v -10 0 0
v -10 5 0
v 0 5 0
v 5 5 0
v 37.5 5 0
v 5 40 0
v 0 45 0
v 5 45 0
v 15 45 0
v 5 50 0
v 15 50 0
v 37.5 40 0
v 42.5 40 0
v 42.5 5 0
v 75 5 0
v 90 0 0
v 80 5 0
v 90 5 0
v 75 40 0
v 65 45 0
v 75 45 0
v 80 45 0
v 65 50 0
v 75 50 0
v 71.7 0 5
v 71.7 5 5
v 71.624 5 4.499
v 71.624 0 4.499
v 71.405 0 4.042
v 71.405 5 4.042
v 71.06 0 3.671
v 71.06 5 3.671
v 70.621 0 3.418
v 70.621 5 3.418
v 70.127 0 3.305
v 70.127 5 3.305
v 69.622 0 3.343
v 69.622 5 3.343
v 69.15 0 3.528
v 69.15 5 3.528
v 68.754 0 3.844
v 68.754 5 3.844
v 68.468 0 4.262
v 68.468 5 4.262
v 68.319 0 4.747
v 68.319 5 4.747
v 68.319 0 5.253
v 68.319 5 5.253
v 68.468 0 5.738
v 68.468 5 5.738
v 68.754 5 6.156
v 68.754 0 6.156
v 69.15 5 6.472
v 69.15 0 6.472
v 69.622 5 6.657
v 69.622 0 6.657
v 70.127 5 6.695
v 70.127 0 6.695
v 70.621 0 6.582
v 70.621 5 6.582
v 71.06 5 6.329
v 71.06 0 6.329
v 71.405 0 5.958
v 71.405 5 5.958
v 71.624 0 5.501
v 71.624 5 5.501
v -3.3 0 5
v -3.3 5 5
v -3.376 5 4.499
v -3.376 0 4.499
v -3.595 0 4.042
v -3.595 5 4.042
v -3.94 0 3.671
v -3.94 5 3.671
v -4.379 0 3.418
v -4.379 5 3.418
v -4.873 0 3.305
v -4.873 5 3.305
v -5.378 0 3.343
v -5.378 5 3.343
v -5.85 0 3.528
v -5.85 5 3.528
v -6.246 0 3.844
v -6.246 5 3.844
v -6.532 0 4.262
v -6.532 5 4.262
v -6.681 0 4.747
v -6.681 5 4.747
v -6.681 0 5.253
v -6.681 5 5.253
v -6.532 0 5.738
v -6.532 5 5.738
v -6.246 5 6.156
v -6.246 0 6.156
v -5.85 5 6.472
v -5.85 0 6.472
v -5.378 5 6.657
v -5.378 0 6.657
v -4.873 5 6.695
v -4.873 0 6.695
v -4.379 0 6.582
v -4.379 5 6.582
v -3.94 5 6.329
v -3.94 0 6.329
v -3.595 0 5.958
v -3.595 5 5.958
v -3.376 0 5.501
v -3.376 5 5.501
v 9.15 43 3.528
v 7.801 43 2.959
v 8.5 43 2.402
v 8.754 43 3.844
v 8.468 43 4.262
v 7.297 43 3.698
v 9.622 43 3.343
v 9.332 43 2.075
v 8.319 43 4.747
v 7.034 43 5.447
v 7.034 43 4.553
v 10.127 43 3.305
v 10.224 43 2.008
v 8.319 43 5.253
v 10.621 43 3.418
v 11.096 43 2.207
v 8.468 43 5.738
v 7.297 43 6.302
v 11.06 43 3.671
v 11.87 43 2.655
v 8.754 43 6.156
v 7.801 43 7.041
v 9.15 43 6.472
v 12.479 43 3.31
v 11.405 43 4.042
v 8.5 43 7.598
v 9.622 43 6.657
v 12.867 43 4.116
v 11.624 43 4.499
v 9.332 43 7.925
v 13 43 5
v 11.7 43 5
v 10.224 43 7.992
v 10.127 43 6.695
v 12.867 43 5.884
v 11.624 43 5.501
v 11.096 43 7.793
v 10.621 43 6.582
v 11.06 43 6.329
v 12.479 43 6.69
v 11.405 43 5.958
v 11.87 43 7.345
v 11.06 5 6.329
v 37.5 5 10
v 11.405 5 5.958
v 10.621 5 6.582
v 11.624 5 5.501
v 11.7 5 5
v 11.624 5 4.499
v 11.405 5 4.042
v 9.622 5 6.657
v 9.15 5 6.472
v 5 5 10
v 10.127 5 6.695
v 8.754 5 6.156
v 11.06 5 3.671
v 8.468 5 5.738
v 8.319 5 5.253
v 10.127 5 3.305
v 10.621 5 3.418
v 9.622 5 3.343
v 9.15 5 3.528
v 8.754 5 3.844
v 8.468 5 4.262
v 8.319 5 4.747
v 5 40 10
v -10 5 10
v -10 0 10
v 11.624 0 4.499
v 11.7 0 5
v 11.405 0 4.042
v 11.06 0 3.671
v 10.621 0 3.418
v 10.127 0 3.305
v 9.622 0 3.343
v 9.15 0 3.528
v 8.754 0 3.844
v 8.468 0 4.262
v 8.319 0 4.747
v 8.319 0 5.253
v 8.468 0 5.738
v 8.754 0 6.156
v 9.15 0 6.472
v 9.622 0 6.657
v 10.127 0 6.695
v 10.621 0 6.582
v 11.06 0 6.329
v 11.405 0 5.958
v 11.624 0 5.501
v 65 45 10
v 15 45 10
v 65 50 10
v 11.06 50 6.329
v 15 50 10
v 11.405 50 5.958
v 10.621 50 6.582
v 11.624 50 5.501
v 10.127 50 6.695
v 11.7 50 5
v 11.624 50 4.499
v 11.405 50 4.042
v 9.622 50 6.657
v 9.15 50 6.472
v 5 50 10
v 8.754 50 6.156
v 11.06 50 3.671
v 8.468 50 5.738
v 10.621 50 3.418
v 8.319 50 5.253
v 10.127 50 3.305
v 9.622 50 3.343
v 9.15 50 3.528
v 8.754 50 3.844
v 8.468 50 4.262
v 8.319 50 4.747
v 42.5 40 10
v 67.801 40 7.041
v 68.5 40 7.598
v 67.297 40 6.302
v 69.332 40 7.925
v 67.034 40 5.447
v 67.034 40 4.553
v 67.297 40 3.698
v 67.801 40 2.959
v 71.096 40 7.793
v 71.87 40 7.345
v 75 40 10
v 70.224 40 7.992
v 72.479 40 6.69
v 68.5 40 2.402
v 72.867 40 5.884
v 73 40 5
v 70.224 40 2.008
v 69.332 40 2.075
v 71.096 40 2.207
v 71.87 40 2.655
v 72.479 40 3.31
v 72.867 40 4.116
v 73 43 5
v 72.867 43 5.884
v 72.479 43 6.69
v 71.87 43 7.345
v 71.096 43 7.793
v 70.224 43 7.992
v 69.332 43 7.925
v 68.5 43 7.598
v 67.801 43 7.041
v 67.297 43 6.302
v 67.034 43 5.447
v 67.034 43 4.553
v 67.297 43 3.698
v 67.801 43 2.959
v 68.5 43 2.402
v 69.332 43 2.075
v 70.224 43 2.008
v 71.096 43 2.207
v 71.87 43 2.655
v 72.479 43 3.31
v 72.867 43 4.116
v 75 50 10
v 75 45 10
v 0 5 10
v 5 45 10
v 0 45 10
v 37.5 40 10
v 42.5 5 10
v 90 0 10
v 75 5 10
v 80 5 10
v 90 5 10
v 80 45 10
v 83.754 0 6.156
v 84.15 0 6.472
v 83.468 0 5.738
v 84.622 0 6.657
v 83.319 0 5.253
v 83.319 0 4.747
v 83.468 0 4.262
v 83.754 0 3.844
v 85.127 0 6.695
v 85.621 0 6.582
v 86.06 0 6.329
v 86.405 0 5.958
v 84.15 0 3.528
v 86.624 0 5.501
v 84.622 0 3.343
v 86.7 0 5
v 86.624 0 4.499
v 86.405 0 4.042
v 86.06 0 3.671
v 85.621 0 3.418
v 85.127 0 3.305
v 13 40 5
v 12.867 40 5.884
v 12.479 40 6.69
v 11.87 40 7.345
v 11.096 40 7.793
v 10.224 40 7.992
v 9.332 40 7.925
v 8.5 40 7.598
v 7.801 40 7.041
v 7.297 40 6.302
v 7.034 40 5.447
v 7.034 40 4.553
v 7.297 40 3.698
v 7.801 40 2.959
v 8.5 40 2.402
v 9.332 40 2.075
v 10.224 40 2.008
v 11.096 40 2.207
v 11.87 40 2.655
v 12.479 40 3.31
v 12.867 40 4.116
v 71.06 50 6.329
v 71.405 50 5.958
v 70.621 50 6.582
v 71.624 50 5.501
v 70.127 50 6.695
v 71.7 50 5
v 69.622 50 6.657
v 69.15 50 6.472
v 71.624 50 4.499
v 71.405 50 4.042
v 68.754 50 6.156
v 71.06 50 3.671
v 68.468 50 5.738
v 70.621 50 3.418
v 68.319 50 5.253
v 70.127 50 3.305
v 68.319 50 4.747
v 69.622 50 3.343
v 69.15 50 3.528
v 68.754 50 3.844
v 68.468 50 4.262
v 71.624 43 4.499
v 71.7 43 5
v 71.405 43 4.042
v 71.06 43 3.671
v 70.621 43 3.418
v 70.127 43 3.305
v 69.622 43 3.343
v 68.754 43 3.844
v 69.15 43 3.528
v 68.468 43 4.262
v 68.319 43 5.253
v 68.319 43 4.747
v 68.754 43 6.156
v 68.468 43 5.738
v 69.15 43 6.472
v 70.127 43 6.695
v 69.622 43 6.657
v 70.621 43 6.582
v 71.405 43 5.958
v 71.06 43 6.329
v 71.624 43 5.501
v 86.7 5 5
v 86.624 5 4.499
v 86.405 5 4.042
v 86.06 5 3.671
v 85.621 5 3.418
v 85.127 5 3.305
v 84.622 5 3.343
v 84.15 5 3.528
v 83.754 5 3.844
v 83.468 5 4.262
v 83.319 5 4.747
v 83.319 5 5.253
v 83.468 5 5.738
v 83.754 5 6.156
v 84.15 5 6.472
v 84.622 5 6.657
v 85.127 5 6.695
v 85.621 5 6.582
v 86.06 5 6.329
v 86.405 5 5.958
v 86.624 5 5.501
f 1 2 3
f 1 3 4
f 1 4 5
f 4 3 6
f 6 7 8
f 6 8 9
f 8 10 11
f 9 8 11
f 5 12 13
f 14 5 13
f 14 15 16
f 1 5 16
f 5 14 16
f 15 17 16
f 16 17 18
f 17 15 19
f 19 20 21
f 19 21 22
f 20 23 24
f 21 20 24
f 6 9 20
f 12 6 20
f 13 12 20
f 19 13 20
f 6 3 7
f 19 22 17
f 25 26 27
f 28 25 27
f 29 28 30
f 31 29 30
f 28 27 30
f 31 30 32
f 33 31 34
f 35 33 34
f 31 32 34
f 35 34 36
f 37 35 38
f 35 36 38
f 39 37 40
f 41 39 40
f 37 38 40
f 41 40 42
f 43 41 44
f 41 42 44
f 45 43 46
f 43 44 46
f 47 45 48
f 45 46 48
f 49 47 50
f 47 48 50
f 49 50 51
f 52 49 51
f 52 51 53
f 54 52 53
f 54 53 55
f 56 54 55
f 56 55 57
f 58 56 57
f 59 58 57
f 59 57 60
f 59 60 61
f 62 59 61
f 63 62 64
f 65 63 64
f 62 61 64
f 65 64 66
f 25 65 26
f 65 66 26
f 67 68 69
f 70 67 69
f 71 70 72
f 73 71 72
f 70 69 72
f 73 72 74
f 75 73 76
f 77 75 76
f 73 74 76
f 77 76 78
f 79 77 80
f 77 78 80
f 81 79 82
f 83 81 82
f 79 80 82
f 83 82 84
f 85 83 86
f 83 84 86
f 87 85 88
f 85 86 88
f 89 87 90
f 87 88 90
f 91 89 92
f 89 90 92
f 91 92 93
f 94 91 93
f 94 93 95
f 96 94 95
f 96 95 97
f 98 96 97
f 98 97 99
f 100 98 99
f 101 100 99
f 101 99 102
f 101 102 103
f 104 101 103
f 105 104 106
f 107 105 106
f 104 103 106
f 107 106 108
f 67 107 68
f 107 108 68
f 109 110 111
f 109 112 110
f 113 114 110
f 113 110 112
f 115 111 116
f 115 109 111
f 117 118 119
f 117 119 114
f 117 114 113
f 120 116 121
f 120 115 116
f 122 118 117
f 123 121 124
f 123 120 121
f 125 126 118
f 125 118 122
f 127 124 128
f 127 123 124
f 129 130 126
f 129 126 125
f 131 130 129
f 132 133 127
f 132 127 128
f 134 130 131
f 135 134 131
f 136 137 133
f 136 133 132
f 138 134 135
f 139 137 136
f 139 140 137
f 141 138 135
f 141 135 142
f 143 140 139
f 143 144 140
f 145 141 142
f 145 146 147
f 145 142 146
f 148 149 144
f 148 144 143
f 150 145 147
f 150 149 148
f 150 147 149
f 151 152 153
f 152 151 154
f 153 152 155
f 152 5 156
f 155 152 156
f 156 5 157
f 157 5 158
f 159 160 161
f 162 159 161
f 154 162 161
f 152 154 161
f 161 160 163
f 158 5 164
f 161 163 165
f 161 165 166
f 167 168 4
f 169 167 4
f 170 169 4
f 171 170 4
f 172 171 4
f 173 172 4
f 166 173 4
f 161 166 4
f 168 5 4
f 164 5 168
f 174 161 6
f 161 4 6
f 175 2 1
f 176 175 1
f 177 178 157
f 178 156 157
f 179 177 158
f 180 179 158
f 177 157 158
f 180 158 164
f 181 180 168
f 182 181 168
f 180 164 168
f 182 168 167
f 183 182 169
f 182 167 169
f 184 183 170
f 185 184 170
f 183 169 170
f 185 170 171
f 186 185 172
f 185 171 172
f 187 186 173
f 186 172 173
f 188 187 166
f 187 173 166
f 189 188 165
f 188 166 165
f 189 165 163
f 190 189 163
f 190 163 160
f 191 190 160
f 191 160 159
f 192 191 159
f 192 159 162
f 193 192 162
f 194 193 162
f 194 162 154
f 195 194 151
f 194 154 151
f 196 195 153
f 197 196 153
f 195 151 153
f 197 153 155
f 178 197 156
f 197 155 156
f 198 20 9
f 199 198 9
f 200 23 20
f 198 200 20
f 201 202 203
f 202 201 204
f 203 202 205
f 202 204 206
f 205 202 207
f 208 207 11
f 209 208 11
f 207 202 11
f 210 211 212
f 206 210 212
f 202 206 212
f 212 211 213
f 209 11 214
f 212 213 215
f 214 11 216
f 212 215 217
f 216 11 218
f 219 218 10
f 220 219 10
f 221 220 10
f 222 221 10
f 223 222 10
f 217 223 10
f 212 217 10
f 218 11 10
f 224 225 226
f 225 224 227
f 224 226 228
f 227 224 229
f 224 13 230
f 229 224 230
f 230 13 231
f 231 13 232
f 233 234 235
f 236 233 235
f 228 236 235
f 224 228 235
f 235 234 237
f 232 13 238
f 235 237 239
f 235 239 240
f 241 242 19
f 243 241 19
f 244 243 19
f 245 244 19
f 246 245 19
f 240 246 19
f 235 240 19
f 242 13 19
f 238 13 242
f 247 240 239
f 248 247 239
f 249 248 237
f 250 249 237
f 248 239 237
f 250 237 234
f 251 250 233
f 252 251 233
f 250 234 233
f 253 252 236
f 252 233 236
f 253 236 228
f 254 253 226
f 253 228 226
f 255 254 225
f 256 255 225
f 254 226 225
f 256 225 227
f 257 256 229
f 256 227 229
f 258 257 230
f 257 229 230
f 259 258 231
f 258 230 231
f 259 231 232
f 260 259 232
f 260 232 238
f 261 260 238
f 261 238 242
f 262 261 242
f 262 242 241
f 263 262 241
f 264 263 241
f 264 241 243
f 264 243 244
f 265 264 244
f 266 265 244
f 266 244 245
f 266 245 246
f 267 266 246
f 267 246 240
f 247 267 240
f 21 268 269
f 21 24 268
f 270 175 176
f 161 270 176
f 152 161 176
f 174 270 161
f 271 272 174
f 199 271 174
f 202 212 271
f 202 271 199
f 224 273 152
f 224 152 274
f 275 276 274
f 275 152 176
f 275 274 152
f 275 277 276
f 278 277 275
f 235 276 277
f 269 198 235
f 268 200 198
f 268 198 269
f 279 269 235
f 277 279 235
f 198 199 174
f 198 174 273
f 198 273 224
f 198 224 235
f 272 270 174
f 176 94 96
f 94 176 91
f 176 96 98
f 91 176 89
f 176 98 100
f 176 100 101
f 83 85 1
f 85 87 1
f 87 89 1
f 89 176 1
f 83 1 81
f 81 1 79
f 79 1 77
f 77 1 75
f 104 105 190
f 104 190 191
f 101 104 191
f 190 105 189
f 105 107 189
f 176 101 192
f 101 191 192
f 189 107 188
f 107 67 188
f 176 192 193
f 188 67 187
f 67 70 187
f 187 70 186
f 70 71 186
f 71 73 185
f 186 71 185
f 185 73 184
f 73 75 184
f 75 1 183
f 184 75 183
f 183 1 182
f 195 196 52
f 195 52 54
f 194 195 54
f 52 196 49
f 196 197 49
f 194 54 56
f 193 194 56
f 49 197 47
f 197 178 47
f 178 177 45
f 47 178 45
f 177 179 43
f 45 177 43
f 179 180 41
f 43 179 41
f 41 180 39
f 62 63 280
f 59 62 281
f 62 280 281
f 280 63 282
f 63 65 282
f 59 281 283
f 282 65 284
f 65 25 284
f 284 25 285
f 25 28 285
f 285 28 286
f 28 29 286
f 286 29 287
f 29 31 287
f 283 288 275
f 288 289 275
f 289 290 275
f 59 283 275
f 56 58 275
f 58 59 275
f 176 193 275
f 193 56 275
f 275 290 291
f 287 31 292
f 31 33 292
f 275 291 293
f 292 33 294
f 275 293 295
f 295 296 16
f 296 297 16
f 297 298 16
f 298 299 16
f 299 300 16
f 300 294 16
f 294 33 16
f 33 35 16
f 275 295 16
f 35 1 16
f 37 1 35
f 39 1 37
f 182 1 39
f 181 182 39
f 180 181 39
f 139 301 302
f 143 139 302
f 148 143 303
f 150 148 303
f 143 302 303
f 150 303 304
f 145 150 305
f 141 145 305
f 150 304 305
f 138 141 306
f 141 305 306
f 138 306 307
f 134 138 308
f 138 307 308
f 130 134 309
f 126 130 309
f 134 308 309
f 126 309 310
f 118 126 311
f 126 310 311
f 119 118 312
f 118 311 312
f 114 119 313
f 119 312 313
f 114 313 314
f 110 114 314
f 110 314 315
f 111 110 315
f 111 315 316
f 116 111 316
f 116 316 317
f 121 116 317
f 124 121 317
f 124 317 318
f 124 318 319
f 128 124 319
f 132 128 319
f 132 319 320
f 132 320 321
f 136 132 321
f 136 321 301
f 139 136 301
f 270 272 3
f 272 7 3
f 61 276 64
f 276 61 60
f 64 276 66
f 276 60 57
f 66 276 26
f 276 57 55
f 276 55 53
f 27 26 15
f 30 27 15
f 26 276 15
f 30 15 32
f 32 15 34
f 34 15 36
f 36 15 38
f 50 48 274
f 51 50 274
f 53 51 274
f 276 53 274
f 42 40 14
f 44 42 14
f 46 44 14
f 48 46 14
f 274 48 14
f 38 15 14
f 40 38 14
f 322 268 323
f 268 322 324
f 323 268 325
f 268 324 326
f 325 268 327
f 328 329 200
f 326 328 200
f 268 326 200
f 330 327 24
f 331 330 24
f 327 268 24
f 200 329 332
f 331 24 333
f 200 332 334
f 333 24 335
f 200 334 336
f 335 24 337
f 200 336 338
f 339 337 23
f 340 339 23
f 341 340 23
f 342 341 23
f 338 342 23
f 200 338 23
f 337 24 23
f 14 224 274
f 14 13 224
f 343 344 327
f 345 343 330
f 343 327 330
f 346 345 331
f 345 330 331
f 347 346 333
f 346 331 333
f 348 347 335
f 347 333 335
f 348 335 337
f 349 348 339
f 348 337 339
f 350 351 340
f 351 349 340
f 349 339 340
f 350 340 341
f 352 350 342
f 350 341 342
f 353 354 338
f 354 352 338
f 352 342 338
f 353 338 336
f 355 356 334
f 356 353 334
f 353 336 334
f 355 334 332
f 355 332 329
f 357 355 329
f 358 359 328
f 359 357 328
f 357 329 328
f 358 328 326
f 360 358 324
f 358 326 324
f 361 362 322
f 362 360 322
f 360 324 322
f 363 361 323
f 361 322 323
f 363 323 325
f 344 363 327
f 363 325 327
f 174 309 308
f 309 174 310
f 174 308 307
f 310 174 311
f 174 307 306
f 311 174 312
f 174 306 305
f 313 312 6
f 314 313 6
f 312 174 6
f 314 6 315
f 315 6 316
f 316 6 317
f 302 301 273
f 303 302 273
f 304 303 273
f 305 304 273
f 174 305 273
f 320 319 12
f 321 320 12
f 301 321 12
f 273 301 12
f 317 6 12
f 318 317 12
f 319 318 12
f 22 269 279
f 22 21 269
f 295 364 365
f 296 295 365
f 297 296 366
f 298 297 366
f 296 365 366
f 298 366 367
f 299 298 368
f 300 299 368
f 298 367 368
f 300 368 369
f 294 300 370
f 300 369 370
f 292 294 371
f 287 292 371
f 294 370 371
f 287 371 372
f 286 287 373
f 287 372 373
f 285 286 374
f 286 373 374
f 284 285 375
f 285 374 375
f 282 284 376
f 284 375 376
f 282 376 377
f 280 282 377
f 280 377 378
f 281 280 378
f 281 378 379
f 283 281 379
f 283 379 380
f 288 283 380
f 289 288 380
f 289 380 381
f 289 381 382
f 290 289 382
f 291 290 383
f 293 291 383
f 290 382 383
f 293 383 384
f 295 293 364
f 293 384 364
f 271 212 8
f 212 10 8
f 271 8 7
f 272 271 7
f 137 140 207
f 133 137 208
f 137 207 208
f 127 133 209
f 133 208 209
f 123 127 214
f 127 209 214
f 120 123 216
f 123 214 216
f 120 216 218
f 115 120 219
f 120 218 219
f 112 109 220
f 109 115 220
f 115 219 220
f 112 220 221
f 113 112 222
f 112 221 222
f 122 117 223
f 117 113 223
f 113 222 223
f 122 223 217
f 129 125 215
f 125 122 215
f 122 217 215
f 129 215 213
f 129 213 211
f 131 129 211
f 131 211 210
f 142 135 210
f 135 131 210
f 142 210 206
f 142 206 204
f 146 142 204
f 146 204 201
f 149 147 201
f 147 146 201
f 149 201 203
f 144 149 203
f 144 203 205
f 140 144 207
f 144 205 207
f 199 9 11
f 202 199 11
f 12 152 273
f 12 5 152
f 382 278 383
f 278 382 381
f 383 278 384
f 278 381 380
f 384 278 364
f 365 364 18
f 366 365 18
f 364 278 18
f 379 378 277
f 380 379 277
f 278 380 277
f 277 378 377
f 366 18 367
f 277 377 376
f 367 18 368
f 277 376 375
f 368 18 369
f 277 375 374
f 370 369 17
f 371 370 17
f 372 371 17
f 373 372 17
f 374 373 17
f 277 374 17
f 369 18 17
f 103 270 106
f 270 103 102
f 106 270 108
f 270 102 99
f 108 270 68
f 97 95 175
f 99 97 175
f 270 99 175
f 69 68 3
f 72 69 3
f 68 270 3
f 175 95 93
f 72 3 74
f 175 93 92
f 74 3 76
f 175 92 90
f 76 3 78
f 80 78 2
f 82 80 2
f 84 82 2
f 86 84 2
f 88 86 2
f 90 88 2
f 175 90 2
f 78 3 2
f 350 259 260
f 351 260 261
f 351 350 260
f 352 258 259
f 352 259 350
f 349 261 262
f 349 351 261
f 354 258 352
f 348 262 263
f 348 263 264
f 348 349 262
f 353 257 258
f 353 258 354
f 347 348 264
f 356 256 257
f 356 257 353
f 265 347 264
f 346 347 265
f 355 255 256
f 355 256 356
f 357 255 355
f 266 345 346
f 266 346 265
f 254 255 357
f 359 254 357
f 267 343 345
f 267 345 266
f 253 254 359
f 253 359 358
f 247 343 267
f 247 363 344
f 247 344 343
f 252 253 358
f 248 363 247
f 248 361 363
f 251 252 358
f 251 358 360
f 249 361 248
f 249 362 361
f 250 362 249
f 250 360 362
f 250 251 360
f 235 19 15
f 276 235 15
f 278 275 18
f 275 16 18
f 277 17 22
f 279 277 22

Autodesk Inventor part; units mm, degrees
ref_plane "YZ Plane" through (0, 0, 0) normal (1, 0, 0) x (0, 1, 0)
ref_plane "XZ Plane" through (0, 0, 0) normal (0, 1, 0) x (-1, 0, 0)
ref_plane "XY Plane" through (0, 0, 0) normal (0, 0, 1) x (1, 0, 0)
sketch "Sketch1" plane through (0, 0, 0) normal (0, 0, 1) x (1, 0, 0)
  line L0 (0, 0) -> (80, 0)
  line L1 (80, 0) -> (80, 50)
  line L2 (80, 50) -> (0, 50)
  line L3 (0, 50) -> (0, 0)
  line L4 (15, 50) -> (65, 50)
  line L5 (65, 50) -> (65, 45)
  line L6 (65, 45) -> (15, 45)
  line L7 (15, 45) -> (15, 50)
  line L8 (5, 40) -> (75, 40)
  line L9 (75, 40) -> (75, 5)
  line L10 (75, 5) -> (5, 5)
  line L11 (5, 5) -> (5, 40)
  line L12 (-10, 0) -> (90, 0)
  line L13 (90, 0) -> (90, 5)
  line L14 (90, 5) -> (-10, 5)
  line L15 (-10, 5) -> (-10, 0)
  line L16 (0, 50) -> (5, 50)
  line L17 (5, 50) -> (5, 45)
  line L18 (5, 45) -> (0, 45)
  line L19 (0, 45) -> (0, 50)
  line L20 (80, 50) -> (75, 50)
  line L21 (75, 50) -> (75, 45)
  line L22 (75, 45) -> (80, 45)
  line L23 (80, 45) -> (80, 50)
  line L24 (37.5, 40) -> (42.5, 40)
  line L25 (42.5, 40) -> (42.5, 5)
  line L26 (42.5, 5) -> (37.5, 5)
  line L27 (37.5, 5) -> (37.5, 40)
  point P0 (40, 50)
  point P1 (40, 5)
  point P2 (40, 0)
  point P3 (40, 40)
  dimension "d0" = 80
  dimension "d1" = 50
  dimension "d2" = 50
  dimension "d3" = 70
  dimension "d4" = 100
  dimension "d5" = 5
  dimension "d6" = 5
  dimension "d7" = 5
  dimension "d10" = 5
  dimension "d11" = 5
  dimension "d12" = 5
extrude "Extrusion1" add sketch "Sketch1" along normal blind 10 contours L3 L14 L10 L1 L0 | L12 L15 L14 L3 | L1 L14 L13 L12 | L3 L18 L17 L2 L7 L6 L5 L21 L22 L1 L14 L9 L8 L11 | L27 L8 L25 L10
sketch "Sketch2" plane through (5, 50, 0) normal (0, 1, 0) x (1, 0, 0)
  line L0 (10, 0) -> (0, 0) projected
  circle A0 centre (5, -5) radius 1.7
  circle A1 centre (-10, -5) radius 1.7
  circle A2 centre (65, -5) radius 1.7
  circle A3 centre (80, -5) radius 1.7
  line L1 (70, -10) -> (70, 0) projected
  line L2 (70, 0) -> (60, 0) projected
  line L3 (85, 0) -> (75, 0) projected
  line L4 (-5, 0) -> (-15, 0) projected
  point P0 (70, -5)
  point P1 (5, 0)
  point P2 (65, 0)
  point P3 (80, 0)
  point P4 (-10, 0)
  dimension "d13" = 3.4
extrude "Extrusion2" cut sketch "Sketch2" against normal through all
sketch "Sketch3" plane through (5, 40, 10) normal (0, -1, 0) x (1, 0, 0)
  circle A0 centre (5, -5) radius 1.7 projected
  circle A1 centre (5, -5) radius 3
  circle A2 centre (65, -5) radius 1.7 projected
  circle A3 centre (65, -5) radius 3
  point P0 (-5, -10)
  dimension "d17" = 6
  dimension "d18" = 6
extrude "Extrusion3" cut sketch "Sketch3" against normal blind 3
properties part number "brush holder stand v5"
